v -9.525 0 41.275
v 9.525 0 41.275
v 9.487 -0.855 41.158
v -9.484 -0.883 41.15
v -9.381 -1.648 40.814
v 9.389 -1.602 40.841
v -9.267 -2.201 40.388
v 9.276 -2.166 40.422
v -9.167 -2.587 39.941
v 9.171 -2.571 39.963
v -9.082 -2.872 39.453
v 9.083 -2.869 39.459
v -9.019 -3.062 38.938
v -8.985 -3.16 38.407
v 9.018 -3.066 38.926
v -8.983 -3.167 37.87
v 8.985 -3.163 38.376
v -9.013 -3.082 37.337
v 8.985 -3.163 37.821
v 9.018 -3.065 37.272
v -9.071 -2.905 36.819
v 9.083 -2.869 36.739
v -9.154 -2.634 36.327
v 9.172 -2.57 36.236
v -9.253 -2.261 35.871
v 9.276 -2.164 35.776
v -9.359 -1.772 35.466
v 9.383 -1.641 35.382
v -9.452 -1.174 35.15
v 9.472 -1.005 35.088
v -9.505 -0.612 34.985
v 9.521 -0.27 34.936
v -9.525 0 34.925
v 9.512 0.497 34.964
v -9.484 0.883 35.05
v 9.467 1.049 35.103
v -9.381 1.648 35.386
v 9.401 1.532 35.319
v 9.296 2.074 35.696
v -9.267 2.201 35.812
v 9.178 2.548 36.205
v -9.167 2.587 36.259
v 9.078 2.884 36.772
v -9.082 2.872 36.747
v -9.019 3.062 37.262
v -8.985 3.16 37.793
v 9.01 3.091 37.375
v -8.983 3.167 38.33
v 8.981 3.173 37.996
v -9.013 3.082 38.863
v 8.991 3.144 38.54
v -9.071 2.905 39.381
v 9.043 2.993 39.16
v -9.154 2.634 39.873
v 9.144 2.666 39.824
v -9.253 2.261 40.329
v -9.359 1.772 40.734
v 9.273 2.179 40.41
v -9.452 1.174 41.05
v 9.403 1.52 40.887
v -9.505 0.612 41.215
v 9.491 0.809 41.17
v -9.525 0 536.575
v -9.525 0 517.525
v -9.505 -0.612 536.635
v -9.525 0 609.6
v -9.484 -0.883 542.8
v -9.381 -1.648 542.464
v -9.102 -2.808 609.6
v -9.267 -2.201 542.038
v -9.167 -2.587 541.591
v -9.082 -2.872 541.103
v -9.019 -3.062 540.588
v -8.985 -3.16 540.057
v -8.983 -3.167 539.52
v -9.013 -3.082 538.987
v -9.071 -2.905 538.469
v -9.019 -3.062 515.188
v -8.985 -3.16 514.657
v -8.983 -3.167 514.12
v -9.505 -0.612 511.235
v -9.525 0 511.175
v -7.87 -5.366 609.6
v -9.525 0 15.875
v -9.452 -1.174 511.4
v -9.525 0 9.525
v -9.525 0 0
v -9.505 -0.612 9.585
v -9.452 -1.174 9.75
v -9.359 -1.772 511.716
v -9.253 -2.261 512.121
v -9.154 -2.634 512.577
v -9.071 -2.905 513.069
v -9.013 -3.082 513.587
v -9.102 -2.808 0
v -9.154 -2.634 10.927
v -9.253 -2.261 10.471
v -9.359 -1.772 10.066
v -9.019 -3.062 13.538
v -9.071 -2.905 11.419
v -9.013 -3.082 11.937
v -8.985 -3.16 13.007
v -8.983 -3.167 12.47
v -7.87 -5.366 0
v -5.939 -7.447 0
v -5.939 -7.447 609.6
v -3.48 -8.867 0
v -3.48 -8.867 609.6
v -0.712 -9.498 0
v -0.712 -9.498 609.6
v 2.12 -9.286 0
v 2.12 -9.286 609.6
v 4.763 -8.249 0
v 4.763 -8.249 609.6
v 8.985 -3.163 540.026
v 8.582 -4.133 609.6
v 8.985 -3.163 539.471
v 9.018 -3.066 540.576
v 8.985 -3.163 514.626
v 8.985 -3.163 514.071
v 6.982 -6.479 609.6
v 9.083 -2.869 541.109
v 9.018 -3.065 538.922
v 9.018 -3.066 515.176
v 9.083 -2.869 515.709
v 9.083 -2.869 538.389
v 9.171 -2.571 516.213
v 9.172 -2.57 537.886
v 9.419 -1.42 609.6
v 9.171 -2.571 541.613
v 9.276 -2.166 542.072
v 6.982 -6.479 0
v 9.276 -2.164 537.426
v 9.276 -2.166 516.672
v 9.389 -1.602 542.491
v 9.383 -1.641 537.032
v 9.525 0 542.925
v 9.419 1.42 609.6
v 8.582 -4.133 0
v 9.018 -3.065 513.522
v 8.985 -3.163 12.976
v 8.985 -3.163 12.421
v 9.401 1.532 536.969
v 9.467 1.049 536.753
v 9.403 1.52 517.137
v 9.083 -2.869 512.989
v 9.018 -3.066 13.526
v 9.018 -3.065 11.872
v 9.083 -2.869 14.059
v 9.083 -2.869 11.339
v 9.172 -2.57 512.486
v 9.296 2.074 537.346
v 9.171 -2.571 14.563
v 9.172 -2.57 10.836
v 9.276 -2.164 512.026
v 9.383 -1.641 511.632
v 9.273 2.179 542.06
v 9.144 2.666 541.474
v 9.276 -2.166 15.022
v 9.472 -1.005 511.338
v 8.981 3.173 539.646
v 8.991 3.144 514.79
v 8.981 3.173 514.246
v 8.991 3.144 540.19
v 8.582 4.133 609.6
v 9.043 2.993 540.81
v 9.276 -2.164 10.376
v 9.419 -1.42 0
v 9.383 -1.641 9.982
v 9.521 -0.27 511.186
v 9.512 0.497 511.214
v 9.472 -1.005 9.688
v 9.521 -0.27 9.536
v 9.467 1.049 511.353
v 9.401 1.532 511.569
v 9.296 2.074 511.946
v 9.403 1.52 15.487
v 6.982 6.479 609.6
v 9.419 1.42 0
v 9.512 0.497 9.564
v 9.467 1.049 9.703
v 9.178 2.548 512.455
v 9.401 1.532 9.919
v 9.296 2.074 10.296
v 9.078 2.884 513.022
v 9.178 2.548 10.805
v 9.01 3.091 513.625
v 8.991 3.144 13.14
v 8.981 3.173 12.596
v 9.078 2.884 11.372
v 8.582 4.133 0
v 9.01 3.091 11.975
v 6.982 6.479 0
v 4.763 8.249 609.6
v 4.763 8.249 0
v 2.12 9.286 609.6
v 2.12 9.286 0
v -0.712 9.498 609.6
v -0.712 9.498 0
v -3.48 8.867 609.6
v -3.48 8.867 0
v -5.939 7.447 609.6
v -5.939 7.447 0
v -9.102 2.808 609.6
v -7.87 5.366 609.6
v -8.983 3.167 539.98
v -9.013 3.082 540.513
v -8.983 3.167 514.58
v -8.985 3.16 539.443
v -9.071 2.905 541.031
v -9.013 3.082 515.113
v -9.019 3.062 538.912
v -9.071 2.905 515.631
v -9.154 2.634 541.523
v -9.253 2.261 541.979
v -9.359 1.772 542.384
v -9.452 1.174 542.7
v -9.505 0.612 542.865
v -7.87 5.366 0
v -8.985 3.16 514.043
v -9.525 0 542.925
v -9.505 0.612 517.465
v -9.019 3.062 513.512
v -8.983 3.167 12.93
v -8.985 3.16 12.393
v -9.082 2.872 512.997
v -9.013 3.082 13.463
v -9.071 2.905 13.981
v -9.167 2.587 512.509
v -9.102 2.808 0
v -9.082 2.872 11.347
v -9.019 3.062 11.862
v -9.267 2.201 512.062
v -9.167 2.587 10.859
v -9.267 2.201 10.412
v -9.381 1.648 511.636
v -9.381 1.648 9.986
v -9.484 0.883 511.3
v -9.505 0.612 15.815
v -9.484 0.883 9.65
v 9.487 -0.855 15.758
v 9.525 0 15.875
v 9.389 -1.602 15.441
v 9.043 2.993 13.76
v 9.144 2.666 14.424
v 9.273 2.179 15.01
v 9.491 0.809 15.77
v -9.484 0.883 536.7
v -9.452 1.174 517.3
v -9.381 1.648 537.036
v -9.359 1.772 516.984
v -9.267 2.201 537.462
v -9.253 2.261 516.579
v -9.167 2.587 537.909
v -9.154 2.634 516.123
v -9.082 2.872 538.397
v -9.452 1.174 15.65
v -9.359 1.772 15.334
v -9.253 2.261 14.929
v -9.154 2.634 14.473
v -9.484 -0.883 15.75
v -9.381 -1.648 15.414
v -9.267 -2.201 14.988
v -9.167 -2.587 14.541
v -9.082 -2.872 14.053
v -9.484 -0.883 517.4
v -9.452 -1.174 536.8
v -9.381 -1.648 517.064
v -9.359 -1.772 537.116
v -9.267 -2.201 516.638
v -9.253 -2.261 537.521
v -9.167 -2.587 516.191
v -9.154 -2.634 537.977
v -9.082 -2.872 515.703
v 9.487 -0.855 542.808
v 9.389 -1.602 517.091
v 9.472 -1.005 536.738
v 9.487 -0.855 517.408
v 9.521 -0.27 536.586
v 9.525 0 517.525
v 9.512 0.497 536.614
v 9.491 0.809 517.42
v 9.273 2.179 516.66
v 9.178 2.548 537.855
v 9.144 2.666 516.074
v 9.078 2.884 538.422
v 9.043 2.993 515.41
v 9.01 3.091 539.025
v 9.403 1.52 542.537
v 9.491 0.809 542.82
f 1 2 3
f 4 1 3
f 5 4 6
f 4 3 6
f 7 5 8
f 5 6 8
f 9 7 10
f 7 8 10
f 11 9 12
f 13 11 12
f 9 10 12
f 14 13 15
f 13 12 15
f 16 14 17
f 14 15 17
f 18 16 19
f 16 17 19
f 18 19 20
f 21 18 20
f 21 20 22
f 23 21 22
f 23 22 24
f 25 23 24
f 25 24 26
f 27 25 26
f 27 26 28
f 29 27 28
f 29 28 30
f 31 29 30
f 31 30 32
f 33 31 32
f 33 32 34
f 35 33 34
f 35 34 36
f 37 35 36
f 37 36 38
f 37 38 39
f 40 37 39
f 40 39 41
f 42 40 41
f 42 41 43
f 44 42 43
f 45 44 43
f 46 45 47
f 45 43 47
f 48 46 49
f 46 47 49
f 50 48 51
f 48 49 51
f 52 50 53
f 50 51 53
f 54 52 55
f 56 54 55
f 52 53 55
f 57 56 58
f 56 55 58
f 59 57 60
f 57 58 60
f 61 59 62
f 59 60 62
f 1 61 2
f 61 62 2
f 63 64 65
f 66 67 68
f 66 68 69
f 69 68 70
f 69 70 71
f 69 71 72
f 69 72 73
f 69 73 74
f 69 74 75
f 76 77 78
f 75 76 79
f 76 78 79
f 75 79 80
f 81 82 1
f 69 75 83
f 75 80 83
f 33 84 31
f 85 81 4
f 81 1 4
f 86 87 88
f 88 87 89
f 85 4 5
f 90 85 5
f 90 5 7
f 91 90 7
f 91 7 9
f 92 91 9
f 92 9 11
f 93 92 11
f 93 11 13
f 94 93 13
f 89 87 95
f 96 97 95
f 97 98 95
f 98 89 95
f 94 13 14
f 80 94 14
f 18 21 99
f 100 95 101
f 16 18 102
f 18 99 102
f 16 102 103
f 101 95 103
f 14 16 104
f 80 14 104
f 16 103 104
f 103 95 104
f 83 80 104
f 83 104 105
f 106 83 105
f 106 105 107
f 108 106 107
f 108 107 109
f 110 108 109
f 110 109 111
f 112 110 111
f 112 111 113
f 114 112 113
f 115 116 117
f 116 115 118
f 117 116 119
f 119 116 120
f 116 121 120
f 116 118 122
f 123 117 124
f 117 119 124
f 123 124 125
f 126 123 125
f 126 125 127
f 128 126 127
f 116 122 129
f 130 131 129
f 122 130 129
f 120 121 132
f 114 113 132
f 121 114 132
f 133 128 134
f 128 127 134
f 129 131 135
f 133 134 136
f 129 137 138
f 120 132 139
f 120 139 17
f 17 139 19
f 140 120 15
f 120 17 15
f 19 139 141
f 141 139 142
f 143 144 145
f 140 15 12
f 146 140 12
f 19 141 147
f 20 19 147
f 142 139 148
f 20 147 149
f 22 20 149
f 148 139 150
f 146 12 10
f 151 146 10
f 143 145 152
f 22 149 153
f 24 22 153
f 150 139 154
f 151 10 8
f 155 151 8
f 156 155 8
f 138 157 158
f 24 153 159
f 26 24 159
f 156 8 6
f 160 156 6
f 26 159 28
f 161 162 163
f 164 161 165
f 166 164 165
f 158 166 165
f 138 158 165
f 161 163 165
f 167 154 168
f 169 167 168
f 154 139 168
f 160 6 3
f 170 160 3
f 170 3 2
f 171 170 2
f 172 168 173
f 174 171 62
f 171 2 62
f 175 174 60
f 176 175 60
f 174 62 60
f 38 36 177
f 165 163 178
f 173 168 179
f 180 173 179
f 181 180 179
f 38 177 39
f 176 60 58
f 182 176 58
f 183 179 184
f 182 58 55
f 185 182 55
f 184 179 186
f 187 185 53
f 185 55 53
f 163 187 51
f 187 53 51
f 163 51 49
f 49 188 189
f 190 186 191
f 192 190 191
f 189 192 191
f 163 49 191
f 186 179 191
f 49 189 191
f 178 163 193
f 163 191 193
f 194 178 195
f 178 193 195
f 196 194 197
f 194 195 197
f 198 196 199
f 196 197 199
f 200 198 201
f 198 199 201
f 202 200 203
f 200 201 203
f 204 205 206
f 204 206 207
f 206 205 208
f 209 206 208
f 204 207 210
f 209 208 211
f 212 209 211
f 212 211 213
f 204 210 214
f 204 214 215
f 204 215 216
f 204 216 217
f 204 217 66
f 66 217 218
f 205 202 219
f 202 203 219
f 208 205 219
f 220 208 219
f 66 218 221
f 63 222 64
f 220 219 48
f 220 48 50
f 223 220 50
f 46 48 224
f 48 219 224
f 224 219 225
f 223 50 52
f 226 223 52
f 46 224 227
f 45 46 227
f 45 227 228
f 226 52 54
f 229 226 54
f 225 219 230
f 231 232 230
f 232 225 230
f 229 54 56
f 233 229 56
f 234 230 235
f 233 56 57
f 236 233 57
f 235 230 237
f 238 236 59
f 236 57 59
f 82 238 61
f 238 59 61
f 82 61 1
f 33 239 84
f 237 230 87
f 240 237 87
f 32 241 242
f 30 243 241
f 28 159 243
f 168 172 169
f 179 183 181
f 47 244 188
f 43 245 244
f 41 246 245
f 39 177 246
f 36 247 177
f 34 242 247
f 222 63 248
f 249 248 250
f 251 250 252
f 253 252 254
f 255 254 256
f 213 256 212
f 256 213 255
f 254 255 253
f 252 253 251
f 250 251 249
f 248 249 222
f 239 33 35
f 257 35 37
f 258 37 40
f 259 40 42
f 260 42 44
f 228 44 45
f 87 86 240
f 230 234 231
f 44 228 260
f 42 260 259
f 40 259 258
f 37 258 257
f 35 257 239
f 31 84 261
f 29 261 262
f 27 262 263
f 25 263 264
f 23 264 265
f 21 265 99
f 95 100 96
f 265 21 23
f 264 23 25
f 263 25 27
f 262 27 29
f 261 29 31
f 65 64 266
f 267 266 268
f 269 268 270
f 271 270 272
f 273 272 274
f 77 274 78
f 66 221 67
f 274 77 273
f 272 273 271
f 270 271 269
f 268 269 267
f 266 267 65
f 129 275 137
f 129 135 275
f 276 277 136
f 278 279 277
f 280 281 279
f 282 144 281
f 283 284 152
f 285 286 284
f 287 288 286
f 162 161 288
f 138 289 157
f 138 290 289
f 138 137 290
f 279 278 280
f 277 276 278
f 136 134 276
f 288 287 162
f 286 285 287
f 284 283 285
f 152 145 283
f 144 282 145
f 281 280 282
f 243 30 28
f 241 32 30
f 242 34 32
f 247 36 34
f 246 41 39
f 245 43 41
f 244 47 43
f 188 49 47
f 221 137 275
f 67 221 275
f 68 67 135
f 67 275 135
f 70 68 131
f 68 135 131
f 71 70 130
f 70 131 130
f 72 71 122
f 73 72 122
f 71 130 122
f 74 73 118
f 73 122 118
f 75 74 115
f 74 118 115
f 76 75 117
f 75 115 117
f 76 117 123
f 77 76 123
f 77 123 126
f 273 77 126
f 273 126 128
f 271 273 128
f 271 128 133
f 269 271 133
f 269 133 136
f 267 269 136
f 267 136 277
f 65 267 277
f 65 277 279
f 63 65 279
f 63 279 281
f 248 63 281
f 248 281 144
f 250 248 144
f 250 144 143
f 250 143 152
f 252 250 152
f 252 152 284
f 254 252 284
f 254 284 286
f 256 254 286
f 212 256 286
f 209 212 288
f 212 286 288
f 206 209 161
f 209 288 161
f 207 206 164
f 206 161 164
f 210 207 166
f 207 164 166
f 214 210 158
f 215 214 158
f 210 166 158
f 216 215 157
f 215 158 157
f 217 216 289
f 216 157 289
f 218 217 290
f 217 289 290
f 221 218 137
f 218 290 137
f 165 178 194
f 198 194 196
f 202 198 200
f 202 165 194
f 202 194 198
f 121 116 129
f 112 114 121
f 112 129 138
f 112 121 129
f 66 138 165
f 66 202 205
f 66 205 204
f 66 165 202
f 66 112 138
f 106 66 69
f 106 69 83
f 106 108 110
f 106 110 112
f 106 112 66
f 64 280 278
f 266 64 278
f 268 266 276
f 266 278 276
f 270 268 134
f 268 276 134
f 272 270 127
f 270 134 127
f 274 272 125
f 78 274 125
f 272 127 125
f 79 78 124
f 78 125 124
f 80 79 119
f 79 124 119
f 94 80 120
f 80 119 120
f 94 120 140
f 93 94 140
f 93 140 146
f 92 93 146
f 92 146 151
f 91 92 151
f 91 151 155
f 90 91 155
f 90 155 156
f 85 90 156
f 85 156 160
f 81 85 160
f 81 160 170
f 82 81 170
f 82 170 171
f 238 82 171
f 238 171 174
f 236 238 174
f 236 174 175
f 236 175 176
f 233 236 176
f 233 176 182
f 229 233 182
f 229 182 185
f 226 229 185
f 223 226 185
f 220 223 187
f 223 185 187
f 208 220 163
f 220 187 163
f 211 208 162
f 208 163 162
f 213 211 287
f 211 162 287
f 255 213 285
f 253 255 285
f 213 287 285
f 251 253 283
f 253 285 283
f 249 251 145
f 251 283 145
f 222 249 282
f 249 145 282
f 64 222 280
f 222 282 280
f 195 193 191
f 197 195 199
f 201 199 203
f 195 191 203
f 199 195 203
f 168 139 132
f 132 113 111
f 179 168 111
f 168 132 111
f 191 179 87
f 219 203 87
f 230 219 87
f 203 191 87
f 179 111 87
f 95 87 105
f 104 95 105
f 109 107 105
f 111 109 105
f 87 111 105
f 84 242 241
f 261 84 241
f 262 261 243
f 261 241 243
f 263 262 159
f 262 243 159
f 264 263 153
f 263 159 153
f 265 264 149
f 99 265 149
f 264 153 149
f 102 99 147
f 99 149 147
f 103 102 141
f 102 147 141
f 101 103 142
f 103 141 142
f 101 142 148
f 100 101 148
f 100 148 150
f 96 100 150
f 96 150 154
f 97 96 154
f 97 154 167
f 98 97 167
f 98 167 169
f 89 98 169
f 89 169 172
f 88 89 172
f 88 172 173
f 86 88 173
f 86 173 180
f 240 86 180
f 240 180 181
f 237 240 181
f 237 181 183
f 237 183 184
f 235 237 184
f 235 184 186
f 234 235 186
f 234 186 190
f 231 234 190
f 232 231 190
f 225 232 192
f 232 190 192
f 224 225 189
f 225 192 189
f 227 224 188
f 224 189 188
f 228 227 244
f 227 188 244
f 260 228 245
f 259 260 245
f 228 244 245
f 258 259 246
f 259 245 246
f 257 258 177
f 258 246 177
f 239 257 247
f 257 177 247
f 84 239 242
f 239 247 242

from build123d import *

# Parameters (mm, degrees)
SKETCH1_R                       = 9.525
BOSS_EXTRUDE1_DEPTH             = 609.6
F_1_4_0_25_DIAMETER_HOLE1_D     = 6.35
F_1_4_0_25_DIAMETER_HOLE1_DEPTH = 25.399
F_1_4_0_25_DIAMETER_HOLE1_TIP   = 1.907732465
F_1_4_0_25_DIAMETER_HOLE2_D     = 6.35
F_1_4_0_25_DIAMETER_HOLE2_DEPTH = 25.4
F_1_4_0_25_DIAMETER_HOLE2_TIP   = 1.907732465


with BuildPart() as part:
    # Sketch1 → Boss-Extrude1 (new body)
    with BuildSketch(Plane.XY):
        with Locations(Location((0, 0, 0), (0, 0, 180))):
            Circle(SKETCH1_R)
    extrude(amount=BOSS_EXTRUDE1_DEPTH)

    # 1/4 (0.25) Diameter Hole1
    with Locations(Plane(origin=(-12.7, 0, 514.35), x_dir=(0, 0, -1), z_dir=(-1, 0, 0))):
        with Locations((0, 0), (-25.4, 0)):
            Hole(F_1_4_0_25_DIAMETER_HOLE1_D / 2, depth=F_1_4_0_25_DIAMETER_HOLE1_DEPTH)
            with Locations((0, 0, -(F_1_4_0_25_DIAMETER_HOLE1_DEPTH + F_1_4_0_25_DIAMETER_HOLE1_TIP / 2))):  # 118° drill point
                Cone(0, F_1_4_0_25_DIAMETER_HOLE1_D / 2, F_1_4_0_25_DIAMETER_HOLE1_TIP, mode=Mode.SUBTRACT)

    # 1/4 (0.25) Diameter Hole2
    with Locations(Plane(origin=(-12.7, 0, 38.1), x_dir=(0, 0, -1), z_dir=(-1, 0, 0))):
        with Locations((0, 0), (25.4, 0)):
            Hole(F_1_4_0_25_DIAMETER_HOLE2_D / 2, depth=F_1_4_0_25_DIAMETER_HOLE2_DEPTH)
            with Locations((0, 0, -(F_1_4_0_25_DIAMETER_HOLE2_DEPTH + F_1_4_0_25_DIAMETER_HOLE2_TIP / 2))):  # 118° drill point
                Cone(0, F_1_4_0_25_DIAMETER_HOLE2_D / 2, F_1_4_0_25_DIAMETER_HOLE2_TIP, mode=Mode.SUBTRACT)


solid = part.part
